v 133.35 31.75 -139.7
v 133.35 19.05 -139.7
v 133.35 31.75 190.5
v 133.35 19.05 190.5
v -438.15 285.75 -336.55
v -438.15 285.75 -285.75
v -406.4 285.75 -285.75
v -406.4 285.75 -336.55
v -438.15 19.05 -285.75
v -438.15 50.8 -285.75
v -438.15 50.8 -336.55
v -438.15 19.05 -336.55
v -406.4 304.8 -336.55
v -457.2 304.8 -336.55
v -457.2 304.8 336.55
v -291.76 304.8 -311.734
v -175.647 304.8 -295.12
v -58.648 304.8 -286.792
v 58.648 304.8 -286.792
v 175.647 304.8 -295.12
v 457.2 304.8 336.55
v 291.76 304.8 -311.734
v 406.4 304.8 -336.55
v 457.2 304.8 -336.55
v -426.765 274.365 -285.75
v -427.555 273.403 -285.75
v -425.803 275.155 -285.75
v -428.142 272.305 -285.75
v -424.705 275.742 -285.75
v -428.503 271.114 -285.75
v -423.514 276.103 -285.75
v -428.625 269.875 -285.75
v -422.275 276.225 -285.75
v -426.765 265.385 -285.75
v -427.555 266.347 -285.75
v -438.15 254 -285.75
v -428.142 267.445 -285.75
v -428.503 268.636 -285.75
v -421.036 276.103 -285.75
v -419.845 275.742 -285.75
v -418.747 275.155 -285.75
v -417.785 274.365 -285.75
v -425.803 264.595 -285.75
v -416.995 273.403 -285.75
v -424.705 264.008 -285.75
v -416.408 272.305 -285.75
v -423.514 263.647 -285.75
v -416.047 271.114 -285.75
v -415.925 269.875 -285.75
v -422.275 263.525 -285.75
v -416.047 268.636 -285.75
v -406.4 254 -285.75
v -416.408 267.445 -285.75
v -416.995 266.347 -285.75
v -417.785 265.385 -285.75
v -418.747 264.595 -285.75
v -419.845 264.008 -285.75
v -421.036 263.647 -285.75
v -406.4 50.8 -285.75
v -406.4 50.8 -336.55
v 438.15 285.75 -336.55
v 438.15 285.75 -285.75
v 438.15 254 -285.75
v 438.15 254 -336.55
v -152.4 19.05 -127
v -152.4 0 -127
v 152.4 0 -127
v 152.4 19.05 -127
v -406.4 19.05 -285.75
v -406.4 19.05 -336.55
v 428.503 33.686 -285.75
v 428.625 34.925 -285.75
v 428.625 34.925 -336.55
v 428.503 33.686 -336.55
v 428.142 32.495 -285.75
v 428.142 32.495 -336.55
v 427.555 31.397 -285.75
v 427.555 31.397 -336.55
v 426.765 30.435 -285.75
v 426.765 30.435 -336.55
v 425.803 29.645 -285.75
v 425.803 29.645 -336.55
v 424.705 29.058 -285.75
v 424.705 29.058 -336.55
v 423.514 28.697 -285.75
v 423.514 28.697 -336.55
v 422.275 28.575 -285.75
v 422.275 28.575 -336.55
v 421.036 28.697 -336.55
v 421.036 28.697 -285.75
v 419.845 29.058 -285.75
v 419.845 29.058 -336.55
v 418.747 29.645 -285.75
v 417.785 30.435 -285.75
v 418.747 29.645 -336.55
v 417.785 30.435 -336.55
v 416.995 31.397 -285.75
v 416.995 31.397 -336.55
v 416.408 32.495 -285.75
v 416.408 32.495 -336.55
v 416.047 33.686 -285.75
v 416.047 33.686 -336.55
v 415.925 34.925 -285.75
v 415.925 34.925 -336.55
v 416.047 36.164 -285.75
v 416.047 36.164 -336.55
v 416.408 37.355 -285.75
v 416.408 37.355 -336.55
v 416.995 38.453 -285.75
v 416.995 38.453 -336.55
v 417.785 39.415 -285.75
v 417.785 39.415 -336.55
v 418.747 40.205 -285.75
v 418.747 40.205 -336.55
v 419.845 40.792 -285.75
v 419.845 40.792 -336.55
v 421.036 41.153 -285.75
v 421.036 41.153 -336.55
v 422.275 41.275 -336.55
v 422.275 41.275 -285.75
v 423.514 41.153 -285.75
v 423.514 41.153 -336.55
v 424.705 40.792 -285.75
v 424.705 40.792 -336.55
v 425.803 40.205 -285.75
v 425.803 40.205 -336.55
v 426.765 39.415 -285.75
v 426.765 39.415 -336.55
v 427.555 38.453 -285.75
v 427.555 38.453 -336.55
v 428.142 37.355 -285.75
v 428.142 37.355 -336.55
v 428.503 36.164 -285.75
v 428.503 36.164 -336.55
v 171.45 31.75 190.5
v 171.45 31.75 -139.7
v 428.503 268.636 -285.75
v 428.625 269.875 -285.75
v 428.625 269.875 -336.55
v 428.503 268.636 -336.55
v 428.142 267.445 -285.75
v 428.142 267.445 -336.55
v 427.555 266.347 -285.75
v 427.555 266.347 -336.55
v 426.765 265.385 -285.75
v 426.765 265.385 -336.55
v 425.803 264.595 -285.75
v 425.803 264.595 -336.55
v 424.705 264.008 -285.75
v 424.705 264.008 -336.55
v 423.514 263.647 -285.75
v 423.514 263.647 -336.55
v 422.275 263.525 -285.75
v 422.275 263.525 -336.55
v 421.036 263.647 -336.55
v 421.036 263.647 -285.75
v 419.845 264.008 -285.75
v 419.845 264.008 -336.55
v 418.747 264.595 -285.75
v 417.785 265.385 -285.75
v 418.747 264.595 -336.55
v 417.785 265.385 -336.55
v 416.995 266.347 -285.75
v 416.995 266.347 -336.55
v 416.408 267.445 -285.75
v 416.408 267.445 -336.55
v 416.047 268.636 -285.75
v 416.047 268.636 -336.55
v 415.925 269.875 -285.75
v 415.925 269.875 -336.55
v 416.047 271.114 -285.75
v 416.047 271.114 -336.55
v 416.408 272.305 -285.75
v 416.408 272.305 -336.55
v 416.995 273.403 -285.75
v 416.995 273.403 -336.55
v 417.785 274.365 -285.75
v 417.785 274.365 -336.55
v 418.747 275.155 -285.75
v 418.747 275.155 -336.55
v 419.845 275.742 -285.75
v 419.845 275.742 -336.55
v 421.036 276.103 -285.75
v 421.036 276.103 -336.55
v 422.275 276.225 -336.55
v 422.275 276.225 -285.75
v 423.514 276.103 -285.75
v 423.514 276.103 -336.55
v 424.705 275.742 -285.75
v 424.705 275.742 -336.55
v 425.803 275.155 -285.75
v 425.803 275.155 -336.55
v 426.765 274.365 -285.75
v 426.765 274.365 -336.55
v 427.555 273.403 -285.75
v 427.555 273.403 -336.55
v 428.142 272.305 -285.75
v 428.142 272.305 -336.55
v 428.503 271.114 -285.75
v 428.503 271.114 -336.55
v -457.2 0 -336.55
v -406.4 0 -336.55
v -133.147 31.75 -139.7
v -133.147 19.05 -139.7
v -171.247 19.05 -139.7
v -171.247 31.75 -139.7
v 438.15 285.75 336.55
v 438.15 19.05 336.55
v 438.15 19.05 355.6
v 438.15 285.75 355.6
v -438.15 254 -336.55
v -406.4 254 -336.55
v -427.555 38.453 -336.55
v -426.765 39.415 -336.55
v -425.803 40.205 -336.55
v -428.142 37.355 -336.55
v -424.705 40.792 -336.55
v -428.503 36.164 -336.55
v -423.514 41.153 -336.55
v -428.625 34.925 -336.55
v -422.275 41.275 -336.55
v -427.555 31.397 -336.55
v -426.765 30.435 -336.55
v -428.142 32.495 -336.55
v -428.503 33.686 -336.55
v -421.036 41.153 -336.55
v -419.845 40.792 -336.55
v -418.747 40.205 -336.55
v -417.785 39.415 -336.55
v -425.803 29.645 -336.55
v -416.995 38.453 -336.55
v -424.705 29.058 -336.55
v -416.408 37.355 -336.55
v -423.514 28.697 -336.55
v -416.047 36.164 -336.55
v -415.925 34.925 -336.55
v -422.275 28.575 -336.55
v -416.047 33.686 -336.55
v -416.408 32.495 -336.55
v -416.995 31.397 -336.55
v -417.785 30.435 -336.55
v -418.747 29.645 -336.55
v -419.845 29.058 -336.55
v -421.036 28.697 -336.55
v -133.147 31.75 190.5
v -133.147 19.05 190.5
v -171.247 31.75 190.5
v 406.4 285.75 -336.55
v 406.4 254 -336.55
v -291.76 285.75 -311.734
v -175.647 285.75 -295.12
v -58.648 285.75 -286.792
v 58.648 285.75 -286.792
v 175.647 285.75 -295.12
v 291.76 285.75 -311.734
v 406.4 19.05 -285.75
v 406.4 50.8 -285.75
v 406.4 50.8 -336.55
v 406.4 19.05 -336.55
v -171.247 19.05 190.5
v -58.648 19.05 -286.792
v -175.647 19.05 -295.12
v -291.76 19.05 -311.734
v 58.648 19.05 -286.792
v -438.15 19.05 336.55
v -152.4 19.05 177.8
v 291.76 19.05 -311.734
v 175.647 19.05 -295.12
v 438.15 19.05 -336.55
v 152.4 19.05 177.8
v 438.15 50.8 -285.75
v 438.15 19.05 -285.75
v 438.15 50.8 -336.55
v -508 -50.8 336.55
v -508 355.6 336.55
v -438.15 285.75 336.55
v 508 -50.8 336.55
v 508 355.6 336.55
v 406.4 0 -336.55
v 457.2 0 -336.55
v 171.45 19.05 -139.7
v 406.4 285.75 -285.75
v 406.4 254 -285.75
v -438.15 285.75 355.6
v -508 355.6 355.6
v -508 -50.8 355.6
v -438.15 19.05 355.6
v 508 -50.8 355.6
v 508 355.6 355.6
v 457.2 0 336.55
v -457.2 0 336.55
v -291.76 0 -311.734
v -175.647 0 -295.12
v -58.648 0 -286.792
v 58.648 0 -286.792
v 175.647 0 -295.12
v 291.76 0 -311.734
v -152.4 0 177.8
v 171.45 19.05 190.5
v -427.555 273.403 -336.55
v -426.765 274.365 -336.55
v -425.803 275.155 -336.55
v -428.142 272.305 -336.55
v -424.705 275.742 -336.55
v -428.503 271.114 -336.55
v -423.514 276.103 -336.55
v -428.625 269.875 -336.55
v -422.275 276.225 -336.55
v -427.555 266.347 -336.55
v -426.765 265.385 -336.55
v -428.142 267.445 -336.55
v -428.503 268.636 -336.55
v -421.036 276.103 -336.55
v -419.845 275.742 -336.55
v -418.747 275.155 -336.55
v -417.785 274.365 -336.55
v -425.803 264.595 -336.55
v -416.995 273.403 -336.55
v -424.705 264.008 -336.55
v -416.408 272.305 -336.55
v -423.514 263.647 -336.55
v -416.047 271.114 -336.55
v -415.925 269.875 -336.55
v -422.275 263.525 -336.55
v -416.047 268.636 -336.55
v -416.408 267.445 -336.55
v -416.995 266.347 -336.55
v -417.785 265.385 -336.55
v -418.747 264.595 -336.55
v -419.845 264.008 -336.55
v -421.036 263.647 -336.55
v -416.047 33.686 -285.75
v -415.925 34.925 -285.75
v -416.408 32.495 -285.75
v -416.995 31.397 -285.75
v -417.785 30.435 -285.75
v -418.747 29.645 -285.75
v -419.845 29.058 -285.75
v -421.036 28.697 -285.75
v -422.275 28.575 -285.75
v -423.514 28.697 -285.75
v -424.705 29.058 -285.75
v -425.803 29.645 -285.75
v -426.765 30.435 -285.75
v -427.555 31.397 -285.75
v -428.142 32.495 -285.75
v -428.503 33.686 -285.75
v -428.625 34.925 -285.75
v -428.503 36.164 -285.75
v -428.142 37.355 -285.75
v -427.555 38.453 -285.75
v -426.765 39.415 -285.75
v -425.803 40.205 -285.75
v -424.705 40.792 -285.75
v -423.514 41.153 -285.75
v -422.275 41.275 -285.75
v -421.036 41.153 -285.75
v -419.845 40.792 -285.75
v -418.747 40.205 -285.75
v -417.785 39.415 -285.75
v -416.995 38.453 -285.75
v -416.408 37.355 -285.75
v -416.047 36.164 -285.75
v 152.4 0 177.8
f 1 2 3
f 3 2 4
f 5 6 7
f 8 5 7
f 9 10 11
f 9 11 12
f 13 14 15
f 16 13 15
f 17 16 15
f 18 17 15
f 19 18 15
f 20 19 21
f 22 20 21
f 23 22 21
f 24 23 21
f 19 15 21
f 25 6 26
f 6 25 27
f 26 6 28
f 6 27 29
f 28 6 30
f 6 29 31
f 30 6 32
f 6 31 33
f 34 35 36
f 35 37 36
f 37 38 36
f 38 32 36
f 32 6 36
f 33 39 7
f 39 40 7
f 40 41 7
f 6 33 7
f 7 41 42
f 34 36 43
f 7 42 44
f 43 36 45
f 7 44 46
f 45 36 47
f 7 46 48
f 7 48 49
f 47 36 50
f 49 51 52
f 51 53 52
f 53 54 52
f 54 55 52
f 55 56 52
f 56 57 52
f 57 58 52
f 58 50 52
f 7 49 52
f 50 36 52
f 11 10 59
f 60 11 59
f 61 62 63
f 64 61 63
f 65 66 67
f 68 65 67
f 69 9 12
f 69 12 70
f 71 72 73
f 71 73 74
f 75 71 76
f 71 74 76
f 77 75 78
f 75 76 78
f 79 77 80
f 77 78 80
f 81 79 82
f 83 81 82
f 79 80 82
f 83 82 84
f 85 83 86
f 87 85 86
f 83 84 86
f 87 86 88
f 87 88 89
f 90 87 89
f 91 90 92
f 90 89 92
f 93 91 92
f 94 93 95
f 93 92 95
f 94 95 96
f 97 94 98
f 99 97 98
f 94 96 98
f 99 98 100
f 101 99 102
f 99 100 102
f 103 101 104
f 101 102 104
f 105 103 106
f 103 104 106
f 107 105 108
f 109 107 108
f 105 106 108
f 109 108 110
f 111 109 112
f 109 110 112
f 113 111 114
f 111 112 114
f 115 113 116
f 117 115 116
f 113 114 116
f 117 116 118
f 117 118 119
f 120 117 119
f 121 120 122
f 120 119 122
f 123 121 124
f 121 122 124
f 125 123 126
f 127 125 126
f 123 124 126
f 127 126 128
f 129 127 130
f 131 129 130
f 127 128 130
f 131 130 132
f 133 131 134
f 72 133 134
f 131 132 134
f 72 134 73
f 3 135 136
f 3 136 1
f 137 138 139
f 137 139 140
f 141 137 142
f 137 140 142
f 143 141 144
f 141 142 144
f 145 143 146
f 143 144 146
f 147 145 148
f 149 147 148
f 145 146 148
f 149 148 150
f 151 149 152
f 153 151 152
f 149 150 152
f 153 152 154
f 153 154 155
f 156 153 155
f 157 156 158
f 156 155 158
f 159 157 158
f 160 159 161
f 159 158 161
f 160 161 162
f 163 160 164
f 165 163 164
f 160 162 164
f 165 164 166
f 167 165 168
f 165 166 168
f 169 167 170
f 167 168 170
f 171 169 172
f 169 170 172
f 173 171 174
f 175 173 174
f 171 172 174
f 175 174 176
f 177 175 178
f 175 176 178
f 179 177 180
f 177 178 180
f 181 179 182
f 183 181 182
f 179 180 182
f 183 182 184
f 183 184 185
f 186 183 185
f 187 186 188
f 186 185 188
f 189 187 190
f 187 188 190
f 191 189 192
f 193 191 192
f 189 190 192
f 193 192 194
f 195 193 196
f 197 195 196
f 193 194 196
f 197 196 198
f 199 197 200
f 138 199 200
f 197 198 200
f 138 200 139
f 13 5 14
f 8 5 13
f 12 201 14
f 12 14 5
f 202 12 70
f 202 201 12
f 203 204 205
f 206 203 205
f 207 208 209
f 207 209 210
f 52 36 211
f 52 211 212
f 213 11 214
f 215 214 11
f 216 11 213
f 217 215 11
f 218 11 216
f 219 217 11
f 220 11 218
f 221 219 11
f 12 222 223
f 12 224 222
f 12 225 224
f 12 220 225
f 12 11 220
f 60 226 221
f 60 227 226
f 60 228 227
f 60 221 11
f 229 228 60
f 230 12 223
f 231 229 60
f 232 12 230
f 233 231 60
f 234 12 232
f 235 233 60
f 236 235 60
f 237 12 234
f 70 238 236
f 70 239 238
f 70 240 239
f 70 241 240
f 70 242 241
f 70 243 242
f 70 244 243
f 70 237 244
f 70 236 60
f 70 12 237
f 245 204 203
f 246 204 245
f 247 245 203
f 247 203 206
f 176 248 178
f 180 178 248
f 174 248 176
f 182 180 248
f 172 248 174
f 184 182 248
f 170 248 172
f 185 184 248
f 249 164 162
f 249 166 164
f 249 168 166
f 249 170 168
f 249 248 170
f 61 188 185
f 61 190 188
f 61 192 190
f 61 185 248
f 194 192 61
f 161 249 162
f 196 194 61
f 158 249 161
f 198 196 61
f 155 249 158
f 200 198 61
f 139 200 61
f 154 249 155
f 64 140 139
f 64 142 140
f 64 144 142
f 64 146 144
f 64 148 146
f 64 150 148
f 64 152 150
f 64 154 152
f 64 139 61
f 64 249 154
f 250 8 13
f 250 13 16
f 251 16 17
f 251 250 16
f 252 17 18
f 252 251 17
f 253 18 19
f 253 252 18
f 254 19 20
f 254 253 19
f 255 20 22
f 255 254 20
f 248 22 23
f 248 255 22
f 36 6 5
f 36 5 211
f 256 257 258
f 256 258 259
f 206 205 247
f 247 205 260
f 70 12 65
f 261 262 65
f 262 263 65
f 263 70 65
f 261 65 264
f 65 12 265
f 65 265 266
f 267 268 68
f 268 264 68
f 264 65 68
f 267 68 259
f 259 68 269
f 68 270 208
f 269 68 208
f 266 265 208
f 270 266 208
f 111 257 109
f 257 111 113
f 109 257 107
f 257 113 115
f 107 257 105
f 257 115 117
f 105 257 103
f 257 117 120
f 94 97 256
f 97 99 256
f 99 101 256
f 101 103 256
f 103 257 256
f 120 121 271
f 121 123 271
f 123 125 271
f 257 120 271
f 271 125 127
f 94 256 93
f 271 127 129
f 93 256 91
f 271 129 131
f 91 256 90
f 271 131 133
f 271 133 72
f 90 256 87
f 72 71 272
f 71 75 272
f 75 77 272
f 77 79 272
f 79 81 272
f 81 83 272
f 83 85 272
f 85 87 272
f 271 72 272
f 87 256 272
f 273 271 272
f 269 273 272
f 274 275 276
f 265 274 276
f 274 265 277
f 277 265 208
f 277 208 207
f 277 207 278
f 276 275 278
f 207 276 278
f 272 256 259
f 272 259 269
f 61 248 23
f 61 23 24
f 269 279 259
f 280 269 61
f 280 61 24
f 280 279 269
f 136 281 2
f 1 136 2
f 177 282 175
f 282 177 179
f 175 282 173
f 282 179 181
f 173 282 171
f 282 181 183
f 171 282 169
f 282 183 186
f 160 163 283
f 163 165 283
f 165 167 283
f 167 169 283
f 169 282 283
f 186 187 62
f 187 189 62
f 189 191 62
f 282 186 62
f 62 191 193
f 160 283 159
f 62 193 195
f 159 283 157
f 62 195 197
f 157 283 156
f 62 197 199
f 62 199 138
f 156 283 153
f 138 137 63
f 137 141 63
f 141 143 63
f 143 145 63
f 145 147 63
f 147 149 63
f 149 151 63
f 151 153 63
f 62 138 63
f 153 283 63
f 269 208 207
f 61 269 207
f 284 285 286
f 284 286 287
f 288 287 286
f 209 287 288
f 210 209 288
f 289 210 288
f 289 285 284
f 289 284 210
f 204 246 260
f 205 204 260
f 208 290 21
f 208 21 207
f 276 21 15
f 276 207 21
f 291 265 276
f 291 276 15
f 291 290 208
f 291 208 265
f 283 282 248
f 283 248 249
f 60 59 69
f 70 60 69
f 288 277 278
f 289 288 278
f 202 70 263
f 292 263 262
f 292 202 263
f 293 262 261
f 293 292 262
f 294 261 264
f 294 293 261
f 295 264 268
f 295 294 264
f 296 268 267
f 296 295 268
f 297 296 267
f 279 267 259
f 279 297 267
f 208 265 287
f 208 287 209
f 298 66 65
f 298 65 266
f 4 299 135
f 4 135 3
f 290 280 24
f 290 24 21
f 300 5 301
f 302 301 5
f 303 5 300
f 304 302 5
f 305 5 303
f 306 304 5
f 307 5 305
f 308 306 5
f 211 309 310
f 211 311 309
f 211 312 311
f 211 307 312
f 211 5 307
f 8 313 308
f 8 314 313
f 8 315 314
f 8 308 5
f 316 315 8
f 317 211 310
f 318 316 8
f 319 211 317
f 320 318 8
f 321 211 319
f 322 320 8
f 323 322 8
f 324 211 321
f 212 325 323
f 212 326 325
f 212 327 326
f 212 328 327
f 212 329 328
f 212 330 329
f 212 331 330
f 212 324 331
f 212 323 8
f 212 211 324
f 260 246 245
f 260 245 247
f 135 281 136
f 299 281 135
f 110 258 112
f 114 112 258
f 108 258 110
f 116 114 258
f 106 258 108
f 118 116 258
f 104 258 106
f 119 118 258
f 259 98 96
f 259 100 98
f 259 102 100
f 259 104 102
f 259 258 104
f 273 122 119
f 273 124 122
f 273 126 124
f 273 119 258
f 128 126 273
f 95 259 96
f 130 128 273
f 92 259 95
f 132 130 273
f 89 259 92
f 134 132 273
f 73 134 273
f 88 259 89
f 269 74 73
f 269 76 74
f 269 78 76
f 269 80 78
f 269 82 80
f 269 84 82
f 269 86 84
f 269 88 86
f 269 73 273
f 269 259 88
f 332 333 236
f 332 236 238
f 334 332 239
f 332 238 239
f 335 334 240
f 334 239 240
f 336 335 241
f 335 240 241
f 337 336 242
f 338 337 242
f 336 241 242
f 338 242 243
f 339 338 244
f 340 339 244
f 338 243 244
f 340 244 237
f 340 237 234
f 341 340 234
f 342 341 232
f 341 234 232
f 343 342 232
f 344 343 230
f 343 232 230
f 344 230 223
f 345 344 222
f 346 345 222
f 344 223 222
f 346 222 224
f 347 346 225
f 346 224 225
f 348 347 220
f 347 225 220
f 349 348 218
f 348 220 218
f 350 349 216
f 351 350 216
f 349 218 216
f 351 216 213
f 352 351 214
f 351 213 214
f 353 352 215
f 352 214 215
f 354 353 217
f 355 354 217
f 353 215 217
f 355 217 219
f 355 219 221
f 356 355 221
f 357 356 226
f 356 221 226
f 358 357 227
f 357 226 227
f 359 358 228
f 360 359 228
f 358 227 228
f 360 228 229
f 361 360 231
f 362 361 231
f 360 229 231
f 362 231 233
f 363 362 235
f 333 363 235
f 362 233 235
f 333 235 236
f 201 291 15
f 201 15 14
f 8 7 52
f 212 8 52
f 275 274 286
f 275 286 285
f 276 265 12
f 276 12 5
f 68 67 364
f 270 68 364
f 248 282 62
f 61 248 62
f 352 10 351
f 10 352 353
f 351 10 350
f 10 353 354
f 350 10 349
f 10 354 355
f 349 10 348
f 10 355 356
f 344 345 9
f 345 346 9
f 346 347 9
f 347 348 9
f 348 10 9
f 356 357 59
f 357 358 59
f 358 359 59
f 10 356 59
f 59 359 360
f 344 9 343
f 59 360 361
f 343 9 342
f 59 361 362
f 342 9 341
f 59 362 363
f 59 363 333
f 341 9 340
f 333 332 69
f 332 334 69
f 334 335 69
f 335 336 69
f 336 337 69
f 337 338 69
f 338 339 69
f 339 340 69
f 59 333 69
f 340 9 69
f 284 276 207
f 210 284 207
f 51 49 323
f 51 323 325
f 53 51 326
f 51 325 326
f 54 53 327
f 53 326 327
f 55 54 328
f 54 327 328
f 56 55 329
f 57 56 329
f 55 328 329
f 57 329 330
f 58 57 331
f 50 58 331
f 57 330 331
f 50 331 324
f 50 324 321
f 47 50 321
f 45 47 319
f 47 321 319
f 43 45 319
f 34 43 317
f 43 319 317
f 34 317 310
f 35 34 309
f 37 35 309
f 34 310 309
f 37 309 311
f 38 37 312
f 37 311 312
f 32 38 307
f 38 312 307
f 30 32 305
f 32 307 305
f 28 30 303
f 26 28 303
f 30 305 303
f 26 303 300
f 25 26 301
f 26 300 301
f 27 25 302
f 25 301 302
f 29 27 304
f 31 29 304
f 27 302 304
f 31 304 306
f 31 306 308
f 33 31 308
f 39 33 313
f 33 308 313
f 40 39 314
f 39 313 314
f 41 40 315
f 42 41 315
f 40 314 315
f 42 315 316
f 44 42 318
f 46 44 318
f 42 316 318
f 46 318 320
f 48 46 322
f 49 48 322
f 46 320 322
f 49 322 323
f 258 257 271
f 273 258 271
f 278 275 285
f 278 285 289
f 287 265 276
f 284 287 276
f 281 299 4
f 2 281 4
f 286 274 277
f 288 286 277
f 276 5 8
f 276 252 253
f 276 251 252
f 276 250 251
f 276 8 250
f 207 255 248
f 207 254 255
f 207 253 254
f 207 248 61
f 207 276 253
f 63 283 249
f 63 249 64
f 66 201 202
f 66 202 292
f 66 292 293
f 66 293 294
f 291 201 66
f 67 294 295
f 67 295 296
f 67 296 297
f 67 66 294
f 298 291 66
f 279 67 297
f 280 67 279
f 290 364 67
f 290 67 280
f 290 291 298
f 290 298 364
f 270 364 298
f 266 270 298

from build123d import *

# Parameters (mm, degrees)
F1_DEPTH  = 304.8
F2_W      = 876.3
F2_H      = 266.7
F3_DEPTH  = 673.101
F4_W      = 152.4
F4_H      = 304.8
F5_DEPTH  = 25.4
F6_W      = 38.1
F6_H      = 330.2
F7_DEPTH  = 12.7
F8_W      = 1016
F8_H      = 406.4
F8_W_2    = 876.3
F8_H_2    = 266.7
F9_DEPTH  = 19.05
F10_W     = 31.75
F10_H     = 31.75
F10_R     = 6.35
F11_DEPTH = 50.8


with BuildPart() as f1:
    # F0 (on Front) → F1 (new body)
    with BuildSketch(Plane.XZ):
        with BuildLine():
            Line((-457.2, -336.55), (-406.4, -336.55))
            ThreePointArc((-406.4, -336.55), (0, -285.75), (406.4, -336.55))
            Line((406.4, -336.55), (457.2, -336.55))
            Line((457.2, -336.55), (457.2, 336.55))
            Line((457.2, 336.55), (-457.2, 336.55))
            Line((-457.2, 336.55), (-457.2, -336.55))
        make_face()
    extrude(amount=-F1_DEPTH)

    # F2 (on face) → F3 (cut, through all)
    with BuildSketch(Plane.XY.offset(336.55)):
        with Locations((0, 152.4)):
            Rectangle(F2_W, F2_H)
    extrude(amount=-F3_DEPTH, mode=Mode.SUBTRACT)

    # F4 (on face) → F5 (cut)
    with BuildSketch(Plane.XZ):
        with Locations((76.2, 25.4)):
            Rectangle(F4_W, F4_H)
        with Locations((-76.2, 25.4)):
            Rectangle(F4_W, F4_H)
    extrude(amount=-F5_DEPTH, mode=Mode.SUBTRACT)


with BuildPart() as f7:
    # F6 (on face) → F7 (new body)
    with BuildSketch(Plane(origin=(0, 19.05, 0), x_dir=(-1, 0, 0), z_dir=(0, 1, 0))):
        with Locations((152.1968, 25.4)):
            Rectangle(F6_W, F6_H)
        with Locations((-152.4, 25.4)):
            Rectangle(F6_W, F6_H)
    extrude(amount=F7_DEPTH)


with BuildPart() as f9:
    # F8 (on face) → F9 (new body)
    with BuildSketch(Plane.XY.offset(336.55)):
        with Locations((0, 152.4)):
            Rectangle(F8_W, F8_H)
        with Locations((0, 152.4)):
            Rectangle(F8_W_2, F8_H_2, mode=Mode.SUBTRACT)
    extrude(amount=F9_DEPTH)


with BuildPart() as f11:
    # F10 (on face) → F11 (new body)
    with BuildSketch(Plane(origin=(0, 0, -336.55), x_dir=(1, 0, 0), z_dir=(0, 0, -1))):
        with Locations((-422.275, -34.925)):
            Rectangle(F10_W, F10_H)
        with Locations((-422.275, -34.925)):
            Circle(F10_R, mode=Mode.SUBTRACT)
        with Locations((-422.275, -269.875)):
            Rectangle(F10_W, F10_H)
        with Locations((-422.275, -269.875)):
            Circle(F10_R, mode=Mode.SUBTRACT)
        with Locations((422.275, -34.925)):
            Rectangle(F10_W, F10_H)
        with Locations((422.275, -34.925)):
            Circle(F10_R, mode=Mode.SUBTRACT)
        with Locations((422.275, -269.875)):
            Rectangle(F10_W, F10_H)
        with Locations((422.275, -269.875)):
            Circle(F10_R, mode=Mode.SUBTRACT)
    extrude(amount=-F11_DEPTH)


solid = Compound([f1.part, f7.part, f9.part, f11.part])
